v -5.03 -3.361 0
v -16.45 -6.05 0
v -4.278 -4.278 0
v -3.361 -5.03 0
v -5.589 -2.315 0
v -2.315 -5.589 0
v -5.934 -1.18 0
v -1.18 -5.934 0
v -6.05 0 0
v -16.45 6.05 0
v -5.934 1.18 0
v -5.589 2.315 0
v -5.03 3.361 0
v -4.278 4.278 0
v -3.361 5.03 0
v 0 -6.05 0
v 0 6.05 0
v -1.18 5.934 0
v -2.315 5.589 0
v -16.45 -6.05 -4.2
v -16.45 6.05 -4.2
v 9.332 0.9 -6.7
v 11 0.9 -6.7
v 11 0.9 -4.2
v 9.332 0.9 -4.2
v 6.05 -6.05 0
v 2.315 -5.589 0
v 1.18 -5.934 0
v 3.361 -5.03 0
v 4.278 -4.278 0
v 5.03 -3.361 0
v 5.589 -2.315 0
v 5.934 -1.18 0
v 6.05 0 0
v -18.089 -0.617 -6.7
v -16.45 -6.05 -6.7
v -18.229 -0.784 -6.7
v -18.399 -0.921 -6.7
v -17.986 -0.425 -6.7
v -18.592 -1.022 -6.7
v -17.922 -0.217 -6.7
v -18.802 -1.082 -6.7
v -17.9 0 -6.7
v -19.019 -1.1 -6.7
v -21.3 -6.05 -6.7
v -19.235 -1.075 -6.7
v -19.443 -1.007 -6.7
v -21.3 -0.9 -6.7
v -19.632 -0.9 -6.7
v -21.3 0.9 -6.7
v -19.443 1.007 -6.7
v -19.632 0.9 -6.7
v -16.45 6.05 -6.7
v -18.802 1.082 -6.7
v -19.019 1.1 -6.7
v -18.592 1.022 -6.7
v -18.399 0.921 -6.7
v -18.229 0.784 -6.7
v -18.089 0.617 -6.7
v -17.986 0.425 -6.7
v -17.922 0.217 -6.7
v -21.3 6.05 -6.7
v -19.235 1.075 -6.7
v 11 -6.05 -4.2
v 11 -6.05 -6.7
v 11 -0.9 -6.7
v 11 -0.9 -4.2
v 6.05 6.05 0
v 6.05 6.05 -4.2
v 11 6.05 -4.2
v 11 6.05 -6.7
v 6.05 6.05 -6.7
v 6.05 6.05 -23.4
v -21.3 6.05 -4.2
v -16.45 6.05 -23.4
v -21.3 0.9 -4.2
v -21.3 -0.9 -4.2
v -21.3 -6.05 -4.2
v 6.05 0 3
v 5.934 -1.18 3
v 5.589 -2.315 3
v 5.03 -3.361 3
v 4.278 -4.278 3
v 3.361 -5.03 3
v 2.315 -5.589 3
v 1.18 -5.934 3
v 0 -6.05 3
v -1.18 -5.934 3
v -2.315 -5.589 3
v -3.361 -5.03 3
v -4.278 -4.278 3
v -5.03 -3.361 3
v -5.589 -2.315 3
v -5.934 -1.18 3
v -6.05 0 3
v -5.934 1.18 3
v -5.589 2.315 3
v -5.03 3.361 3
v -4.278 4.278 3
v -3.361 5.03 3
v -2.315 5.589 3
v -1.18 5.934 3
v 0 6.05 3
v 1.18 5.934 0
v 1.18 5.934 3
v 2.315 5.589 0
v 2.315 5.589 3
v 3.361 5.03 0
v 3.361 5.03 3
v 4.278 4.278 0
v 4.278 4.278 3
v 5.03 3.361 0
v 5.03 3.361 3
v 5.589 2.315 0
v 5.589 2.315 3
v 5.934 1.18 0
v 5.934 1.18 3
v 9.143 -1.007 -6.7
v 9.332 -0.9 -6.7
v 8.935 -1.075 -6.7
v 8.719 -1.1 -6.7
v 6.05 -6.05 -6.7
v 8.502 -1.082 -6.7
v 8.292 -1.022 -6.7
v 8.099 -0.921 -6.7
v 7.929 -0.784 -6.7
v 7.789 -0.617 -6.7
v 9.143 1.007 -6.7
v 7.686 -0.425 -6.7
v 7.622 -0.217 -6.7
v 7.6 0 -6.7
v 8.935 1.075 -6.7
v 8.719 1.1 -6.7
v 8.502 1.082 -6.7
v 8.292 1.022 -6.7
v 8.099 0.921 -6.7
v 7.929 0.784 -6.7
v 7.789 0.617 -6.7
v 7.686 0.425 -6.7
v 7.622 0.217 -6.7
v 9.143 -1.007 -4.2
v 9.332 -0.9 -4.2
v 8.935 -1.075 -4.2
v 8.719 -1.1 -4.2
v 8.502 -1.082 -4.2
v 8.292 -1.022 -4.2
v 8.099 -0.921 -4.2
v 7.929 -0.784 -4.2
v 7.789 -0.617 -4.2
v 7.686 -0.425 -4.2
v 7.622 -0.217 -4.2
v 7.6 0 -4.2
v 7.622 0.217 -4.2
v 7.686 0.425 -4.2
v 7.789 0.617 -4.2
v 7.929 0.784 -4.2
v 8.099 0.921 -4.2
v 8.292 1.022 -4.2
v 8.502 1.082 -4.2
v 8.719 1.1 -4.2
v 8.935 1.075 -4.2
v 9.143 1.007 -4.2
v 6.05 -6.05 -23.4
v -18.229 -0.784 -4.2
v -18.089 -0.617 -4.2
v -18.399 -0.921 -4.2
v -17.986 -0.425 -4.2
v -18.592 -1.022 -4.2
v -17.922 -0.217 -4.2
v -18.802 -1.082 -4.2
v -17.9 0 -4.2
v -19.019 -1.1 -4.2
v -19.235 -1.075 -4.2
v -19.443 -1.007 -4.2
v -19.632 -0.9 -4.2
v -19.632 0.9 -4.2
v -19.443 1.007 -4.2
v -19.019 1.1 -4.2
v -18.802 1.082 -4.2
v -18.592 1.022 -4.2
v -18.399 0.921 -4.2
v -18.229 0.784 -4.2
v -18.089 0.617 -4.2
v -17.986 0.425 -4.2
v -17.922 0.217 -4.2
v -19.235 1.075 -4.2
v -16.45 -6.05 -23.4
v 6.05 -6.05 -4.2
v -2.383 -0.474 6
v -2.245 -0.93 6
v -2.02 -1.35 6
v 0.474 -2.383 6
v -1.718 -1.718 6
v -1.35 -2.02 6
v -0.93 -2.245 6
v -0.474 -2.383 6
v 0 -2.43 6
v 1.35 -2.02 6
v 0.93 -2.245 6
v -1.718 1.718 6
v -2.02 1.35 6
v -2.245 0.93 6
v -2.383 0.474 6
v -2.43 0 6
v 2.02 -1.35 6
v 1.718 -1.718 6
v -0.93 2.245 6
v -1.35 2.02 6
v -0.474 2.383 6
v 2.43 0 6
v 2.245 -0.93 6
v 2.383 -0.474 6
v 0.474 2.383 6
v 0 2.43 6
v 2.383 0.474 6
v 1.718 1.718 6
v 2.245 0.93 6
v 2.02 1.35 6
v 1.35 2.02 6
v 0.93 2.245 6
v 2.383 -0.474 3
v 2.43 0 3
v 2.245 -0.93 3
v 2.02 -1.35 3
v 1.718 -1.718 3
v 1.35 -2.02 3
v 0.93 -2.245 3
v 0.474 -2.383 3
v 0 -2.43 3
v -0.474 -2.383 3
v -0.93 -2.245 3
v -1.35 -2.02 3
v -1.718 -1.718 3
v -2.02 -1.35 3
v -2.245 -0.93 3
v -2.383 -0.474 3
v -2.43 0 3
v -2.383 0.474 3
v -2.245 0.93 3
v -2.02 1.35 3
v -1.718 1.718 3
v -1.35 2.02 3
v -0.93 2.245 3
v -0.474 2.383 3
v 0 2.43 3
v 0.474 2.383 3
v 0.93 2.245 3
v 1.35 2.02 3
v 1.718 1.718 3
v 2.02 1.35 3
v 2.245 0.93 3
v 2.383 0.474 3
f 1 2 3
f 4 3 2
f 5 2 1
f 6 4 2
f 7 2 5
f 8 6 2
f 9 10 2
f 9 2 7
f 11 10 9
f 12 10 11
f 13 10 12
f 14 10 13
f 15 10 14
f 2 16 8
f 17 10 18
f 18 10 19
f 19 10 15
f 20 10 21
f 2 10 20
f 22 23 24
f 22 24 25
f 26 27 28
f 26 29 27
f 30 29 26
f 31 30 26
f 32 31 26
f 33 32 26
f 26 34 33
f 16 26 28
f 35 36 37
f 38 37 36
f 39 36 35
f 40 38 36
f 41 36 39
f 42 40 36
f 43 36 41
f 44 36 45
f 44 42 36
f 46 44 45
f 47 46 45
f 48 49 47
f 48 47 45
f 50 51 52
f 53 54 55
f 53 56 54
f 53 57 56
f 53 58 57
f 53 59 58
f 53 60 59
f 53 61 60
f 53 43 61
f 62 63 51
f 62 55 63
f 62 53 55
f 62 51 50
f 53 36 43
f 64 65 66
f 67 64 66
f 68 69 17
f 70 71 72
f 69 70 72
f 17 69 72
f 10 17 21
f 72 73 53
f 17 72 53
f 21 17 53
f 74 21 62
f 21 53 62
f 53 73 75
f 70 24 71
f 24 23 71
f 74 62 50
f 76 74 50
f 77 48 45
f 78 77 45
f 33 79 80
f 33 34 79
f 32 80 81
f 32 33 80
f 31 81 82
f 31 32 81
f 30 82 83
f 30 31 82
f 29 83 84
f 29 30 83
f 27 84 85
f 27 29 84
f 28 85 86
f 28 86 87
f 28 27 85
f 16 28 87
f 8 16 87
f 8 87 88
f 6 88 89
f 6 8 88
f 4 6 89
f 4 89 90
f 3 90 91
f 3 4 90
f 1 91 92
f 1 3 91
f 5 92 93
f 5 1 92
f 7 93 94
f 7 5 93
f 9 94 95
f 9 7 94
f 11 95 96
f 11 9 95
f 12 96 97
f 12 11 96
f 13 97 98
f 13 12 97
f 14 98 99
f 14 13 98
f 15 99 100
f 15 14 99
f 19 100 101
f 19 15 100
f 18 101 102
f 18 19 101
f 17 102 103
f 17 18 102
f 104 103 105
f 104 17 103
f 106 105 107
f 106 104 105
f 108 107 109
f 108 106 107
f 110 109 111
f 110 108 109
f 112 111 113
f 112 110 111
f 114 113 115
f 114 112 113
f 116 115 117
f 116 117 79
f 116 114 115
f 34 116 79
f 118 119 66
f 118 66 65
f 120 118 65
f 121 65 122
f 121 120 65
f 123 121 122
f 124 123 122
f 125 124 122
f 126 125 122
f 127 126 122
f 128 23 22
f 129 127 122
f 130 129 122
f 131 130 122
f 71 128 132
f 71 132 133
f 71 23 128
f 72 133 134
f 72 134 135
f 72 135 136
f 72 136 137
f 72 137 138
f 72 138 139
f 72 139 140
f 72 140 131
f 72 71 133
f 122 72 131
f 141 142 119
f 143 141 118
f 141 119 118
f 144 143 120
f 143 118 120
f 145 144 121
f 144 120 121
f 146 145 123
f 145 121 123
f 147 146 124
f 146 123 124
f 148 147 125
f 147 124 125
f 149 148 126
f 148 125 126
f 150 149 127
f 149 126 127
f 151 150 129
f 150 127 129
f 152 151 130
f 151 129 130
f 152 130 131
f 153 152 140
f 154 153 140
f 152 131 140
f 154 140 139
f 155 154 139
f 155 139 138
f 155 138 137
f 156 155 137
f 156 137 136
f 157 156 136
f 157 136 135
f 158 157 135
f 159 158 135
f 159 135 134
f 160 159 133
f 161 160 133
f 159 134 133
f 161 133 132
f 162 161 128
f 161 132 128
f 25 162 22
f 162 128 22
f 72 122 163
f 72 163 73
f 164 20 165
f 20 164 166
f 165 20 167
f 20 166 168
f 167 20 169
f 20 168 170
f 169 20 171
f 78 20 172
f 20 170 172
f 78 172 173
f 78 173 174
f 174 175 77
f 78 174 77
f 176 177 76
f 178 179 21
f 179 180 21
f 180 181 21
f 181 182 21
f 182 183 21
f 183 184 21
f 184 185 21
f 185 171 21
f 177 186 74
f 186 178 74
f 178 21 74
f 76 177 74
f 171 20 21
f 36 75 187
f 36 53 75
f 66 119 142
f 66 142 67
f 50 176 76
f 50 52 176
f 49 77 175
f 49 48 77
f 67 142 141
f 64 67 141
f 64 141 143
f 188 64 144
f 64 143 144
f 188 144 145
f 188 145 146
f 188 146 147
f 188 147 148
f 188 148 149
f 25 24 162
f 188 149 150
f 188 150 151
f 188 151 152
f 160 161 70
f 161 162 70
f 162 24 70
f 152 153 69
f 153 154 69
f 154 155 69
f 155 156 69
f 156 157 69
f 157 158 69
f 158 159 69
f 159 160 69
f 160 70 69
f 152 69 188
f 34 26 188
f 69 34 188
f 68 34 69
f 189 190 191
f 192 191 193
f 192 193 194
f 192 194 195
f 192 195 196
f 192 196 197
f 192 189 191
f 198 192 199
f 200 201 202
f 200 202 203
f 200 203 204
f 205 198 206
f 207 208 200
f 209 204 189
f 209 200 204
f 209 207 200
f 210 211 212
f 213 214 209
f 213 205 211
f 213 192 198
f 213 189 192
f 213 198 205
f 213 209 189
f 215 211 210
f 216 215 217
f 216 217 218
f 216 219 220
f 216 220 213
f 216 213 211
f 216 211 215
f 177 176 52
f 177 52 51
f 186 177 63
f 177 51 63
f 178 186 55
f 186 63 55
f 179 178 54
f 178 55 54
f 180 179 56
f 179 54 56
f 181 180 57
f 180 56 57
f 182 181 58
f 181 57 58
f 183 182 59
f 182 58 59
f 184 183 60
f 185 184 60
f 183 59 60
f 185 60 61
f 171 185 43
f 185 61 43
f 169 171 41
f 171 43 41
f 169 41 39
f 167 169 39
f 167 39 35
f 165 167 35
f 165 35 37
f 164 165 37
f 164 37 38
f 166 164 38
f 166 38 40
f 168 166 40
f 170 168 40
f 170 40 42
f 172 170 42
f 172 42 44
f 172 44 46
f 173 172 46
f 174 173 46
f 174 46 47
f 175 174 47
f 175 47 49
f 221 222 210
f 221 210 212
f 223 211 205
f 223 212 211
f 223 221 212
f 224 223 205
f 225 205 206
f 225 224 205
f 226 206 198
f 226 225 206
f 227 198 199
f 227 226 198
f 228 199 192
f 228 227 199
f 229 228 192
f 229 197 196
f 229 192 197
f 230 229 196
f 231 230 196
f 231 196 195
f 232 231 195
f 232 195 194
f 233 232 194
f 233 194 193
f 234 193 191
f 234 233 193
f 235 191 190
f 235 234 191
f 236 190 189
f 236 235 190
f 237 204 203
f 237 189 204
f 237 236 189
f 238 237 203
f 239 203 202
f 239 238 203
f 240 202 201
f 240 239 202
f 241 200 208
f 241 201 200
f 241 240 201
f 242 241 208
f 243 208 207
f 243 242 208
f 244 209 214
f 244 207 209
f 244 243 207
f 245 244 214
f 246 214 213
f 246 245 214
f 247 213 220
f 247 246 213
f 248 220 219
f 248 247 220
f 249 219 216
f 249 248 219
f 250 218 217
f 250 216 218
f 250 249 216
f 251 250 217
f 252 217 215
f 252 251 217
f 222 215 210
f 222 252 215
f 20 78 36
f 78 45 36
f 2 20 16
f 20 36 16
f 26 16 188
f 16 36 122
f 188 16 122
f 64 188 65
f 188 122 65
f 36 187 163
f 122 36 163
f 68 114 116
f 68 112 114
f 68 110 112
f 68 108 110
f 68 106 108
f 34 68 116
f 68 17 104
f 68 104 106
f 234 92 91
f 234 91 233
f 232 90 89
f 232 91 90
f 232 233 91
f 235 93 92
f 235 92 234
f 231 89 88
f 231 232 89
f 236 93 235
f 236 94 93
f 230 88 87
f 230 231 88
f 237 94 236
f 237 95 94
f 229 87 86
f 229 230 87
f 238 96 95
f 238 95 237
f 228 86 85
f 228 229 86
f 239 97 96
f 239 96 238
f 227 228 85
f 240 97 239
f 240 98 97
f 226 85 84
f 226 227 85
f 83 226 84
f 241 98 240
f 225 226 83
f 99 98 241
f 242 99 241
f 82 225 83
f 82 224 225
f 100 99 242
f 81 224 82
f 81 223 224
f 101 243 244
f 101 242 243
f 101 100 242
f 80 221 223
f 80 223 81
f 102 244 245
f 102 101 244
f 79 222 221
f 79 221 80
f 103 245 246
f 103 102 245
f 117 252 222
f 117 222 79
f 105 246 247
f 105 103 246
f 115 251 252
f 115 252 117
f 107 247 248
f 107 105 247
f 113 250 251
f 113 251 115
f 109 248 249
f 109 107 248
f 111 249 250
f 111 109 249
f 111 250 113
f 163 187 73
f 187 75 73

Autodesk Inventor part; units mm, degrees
ref_plane "YZ Plane" through (0, 0, 0) normal (1, 0, 0) x (0, 1, 0)
ref_plane "XZ Plane" through (0, 0, 0) normal (0, 1, 0) x (-1, 0, 0)
sketch "スケッチ1" plane through (0, 0, 0) normal (0, 0, 1) x (1, 0, 0)
  line L0 (-19, 8.4016) -> (-19, -8.0875) construction
  line L1 (0, -8.2446) -> (0, 8.2446) construction
  line L2 (8.7, 8.4016) -> (8.7, -8.0875) construction
  circle A0 centre (0, 0) radius 6.05
  line L3 (6.05, 6.05) -> (-16.45, 6.05)
  line L4 (-16.45, 6.05) -> (-16.45, -6.05)
  line L5 (-16.45, -6.05) -> (6.05, -6.05)
  line L6 (6.05, -6.05) -> (6.05, 6.05)
  point P0 (6.05, 0)
  dimension "HEIGHT" = 12.1
  dimension "d0" = 8.7
  dimension "d1" = 27.7
  dimension "WIDTH" = 22.5
extrude "軸台" add sketch "スケッチ1" along normal blind 3 contours A0
extrude "本体" add sketch "スケッチ1" against normal blind 23.4
ref_plane "作業平面1" through (0, 0, -6.7) normal (0, 0, -1) x (-1, 0, 0)
sketch "スケッチ2" plane through (0, 0, -6.7) normal (0, 0, -1) x (-1, 0, 0)
  line L0 (-11, 6.05) -> (21.3, 6.05)
  line L1 (21.3, 6.05) -> (21.3, -6.05)
  line L2 (21.3, -6.05) -> (-11, -6.05)
  line L3 (-11, -6.05) -> (-11, 6.05)
  line L4 (-6.05, 6.05) -> (0, 6.05) projected
  line L5 (0, -6.05) -> (-6.05, -6.05) projected
  circle A0 centre (19, 0) radius 1.1
  circle A1 centre (-8.7, 0) radius 1.1
  line L6 (-8.7, 8.0806) -> (-8.7, -7.6301) construction
  line L7 (19, -7.6301) -> (19, 8.0806) construction
  line L8 (5.15, 8.0806) -> (5.15, -7.8882) construction
  line L9 (-11, 0.9) -> (-9.3325, 0.9)
  line L10 (-9.3325, 0.9) -> (-9.3325, -0.9)
  line L11 (-9.3325, -0.9) -> (-11, -0.9)
  line L12 (-11, -0.9) -> (-11, 0.9)
  line L13 (19.6325, 0.9) -> (21.3, 0.9)
  line L14 (21.3, 0.9) -> (21.3, -0.9)
  line L15 (21.3, -0.9) -> (19.6325, -0.9)
  line L16 (19.6325, -0.9) -> (19.6325, 0.9)
  point P0 (0, 0)
  point P1 (5.15, 6.05)
  point P2 (-11, 0)
  point P3 (21.3, 0)
  dimension "d10" = 2.2
  dimension "d9" = 32.3
  dimension "d11" = 8.7
  dimension "d12" = 27.7
  dimension "d13" = 1.8
extrude "タブ" add sketch "スケッチ2" against normal blind 2.5 contours L0 L1 L13 A0 L15 L2 L3 L11 A1 L9
sketch "スケッチ3" plane through (0, 0, 3) normal (0, 0, 1) x (1, 0, 0)
  circle A0 centre (0, 0) radius 2.43
  dimension "d16" = 4.86
extrude "軸" add sketch "スケッチ3" along normal blind 3
equation "\"d11\" = d0"
equation "\"d12\" = d1"
properties part number "FS90R"
